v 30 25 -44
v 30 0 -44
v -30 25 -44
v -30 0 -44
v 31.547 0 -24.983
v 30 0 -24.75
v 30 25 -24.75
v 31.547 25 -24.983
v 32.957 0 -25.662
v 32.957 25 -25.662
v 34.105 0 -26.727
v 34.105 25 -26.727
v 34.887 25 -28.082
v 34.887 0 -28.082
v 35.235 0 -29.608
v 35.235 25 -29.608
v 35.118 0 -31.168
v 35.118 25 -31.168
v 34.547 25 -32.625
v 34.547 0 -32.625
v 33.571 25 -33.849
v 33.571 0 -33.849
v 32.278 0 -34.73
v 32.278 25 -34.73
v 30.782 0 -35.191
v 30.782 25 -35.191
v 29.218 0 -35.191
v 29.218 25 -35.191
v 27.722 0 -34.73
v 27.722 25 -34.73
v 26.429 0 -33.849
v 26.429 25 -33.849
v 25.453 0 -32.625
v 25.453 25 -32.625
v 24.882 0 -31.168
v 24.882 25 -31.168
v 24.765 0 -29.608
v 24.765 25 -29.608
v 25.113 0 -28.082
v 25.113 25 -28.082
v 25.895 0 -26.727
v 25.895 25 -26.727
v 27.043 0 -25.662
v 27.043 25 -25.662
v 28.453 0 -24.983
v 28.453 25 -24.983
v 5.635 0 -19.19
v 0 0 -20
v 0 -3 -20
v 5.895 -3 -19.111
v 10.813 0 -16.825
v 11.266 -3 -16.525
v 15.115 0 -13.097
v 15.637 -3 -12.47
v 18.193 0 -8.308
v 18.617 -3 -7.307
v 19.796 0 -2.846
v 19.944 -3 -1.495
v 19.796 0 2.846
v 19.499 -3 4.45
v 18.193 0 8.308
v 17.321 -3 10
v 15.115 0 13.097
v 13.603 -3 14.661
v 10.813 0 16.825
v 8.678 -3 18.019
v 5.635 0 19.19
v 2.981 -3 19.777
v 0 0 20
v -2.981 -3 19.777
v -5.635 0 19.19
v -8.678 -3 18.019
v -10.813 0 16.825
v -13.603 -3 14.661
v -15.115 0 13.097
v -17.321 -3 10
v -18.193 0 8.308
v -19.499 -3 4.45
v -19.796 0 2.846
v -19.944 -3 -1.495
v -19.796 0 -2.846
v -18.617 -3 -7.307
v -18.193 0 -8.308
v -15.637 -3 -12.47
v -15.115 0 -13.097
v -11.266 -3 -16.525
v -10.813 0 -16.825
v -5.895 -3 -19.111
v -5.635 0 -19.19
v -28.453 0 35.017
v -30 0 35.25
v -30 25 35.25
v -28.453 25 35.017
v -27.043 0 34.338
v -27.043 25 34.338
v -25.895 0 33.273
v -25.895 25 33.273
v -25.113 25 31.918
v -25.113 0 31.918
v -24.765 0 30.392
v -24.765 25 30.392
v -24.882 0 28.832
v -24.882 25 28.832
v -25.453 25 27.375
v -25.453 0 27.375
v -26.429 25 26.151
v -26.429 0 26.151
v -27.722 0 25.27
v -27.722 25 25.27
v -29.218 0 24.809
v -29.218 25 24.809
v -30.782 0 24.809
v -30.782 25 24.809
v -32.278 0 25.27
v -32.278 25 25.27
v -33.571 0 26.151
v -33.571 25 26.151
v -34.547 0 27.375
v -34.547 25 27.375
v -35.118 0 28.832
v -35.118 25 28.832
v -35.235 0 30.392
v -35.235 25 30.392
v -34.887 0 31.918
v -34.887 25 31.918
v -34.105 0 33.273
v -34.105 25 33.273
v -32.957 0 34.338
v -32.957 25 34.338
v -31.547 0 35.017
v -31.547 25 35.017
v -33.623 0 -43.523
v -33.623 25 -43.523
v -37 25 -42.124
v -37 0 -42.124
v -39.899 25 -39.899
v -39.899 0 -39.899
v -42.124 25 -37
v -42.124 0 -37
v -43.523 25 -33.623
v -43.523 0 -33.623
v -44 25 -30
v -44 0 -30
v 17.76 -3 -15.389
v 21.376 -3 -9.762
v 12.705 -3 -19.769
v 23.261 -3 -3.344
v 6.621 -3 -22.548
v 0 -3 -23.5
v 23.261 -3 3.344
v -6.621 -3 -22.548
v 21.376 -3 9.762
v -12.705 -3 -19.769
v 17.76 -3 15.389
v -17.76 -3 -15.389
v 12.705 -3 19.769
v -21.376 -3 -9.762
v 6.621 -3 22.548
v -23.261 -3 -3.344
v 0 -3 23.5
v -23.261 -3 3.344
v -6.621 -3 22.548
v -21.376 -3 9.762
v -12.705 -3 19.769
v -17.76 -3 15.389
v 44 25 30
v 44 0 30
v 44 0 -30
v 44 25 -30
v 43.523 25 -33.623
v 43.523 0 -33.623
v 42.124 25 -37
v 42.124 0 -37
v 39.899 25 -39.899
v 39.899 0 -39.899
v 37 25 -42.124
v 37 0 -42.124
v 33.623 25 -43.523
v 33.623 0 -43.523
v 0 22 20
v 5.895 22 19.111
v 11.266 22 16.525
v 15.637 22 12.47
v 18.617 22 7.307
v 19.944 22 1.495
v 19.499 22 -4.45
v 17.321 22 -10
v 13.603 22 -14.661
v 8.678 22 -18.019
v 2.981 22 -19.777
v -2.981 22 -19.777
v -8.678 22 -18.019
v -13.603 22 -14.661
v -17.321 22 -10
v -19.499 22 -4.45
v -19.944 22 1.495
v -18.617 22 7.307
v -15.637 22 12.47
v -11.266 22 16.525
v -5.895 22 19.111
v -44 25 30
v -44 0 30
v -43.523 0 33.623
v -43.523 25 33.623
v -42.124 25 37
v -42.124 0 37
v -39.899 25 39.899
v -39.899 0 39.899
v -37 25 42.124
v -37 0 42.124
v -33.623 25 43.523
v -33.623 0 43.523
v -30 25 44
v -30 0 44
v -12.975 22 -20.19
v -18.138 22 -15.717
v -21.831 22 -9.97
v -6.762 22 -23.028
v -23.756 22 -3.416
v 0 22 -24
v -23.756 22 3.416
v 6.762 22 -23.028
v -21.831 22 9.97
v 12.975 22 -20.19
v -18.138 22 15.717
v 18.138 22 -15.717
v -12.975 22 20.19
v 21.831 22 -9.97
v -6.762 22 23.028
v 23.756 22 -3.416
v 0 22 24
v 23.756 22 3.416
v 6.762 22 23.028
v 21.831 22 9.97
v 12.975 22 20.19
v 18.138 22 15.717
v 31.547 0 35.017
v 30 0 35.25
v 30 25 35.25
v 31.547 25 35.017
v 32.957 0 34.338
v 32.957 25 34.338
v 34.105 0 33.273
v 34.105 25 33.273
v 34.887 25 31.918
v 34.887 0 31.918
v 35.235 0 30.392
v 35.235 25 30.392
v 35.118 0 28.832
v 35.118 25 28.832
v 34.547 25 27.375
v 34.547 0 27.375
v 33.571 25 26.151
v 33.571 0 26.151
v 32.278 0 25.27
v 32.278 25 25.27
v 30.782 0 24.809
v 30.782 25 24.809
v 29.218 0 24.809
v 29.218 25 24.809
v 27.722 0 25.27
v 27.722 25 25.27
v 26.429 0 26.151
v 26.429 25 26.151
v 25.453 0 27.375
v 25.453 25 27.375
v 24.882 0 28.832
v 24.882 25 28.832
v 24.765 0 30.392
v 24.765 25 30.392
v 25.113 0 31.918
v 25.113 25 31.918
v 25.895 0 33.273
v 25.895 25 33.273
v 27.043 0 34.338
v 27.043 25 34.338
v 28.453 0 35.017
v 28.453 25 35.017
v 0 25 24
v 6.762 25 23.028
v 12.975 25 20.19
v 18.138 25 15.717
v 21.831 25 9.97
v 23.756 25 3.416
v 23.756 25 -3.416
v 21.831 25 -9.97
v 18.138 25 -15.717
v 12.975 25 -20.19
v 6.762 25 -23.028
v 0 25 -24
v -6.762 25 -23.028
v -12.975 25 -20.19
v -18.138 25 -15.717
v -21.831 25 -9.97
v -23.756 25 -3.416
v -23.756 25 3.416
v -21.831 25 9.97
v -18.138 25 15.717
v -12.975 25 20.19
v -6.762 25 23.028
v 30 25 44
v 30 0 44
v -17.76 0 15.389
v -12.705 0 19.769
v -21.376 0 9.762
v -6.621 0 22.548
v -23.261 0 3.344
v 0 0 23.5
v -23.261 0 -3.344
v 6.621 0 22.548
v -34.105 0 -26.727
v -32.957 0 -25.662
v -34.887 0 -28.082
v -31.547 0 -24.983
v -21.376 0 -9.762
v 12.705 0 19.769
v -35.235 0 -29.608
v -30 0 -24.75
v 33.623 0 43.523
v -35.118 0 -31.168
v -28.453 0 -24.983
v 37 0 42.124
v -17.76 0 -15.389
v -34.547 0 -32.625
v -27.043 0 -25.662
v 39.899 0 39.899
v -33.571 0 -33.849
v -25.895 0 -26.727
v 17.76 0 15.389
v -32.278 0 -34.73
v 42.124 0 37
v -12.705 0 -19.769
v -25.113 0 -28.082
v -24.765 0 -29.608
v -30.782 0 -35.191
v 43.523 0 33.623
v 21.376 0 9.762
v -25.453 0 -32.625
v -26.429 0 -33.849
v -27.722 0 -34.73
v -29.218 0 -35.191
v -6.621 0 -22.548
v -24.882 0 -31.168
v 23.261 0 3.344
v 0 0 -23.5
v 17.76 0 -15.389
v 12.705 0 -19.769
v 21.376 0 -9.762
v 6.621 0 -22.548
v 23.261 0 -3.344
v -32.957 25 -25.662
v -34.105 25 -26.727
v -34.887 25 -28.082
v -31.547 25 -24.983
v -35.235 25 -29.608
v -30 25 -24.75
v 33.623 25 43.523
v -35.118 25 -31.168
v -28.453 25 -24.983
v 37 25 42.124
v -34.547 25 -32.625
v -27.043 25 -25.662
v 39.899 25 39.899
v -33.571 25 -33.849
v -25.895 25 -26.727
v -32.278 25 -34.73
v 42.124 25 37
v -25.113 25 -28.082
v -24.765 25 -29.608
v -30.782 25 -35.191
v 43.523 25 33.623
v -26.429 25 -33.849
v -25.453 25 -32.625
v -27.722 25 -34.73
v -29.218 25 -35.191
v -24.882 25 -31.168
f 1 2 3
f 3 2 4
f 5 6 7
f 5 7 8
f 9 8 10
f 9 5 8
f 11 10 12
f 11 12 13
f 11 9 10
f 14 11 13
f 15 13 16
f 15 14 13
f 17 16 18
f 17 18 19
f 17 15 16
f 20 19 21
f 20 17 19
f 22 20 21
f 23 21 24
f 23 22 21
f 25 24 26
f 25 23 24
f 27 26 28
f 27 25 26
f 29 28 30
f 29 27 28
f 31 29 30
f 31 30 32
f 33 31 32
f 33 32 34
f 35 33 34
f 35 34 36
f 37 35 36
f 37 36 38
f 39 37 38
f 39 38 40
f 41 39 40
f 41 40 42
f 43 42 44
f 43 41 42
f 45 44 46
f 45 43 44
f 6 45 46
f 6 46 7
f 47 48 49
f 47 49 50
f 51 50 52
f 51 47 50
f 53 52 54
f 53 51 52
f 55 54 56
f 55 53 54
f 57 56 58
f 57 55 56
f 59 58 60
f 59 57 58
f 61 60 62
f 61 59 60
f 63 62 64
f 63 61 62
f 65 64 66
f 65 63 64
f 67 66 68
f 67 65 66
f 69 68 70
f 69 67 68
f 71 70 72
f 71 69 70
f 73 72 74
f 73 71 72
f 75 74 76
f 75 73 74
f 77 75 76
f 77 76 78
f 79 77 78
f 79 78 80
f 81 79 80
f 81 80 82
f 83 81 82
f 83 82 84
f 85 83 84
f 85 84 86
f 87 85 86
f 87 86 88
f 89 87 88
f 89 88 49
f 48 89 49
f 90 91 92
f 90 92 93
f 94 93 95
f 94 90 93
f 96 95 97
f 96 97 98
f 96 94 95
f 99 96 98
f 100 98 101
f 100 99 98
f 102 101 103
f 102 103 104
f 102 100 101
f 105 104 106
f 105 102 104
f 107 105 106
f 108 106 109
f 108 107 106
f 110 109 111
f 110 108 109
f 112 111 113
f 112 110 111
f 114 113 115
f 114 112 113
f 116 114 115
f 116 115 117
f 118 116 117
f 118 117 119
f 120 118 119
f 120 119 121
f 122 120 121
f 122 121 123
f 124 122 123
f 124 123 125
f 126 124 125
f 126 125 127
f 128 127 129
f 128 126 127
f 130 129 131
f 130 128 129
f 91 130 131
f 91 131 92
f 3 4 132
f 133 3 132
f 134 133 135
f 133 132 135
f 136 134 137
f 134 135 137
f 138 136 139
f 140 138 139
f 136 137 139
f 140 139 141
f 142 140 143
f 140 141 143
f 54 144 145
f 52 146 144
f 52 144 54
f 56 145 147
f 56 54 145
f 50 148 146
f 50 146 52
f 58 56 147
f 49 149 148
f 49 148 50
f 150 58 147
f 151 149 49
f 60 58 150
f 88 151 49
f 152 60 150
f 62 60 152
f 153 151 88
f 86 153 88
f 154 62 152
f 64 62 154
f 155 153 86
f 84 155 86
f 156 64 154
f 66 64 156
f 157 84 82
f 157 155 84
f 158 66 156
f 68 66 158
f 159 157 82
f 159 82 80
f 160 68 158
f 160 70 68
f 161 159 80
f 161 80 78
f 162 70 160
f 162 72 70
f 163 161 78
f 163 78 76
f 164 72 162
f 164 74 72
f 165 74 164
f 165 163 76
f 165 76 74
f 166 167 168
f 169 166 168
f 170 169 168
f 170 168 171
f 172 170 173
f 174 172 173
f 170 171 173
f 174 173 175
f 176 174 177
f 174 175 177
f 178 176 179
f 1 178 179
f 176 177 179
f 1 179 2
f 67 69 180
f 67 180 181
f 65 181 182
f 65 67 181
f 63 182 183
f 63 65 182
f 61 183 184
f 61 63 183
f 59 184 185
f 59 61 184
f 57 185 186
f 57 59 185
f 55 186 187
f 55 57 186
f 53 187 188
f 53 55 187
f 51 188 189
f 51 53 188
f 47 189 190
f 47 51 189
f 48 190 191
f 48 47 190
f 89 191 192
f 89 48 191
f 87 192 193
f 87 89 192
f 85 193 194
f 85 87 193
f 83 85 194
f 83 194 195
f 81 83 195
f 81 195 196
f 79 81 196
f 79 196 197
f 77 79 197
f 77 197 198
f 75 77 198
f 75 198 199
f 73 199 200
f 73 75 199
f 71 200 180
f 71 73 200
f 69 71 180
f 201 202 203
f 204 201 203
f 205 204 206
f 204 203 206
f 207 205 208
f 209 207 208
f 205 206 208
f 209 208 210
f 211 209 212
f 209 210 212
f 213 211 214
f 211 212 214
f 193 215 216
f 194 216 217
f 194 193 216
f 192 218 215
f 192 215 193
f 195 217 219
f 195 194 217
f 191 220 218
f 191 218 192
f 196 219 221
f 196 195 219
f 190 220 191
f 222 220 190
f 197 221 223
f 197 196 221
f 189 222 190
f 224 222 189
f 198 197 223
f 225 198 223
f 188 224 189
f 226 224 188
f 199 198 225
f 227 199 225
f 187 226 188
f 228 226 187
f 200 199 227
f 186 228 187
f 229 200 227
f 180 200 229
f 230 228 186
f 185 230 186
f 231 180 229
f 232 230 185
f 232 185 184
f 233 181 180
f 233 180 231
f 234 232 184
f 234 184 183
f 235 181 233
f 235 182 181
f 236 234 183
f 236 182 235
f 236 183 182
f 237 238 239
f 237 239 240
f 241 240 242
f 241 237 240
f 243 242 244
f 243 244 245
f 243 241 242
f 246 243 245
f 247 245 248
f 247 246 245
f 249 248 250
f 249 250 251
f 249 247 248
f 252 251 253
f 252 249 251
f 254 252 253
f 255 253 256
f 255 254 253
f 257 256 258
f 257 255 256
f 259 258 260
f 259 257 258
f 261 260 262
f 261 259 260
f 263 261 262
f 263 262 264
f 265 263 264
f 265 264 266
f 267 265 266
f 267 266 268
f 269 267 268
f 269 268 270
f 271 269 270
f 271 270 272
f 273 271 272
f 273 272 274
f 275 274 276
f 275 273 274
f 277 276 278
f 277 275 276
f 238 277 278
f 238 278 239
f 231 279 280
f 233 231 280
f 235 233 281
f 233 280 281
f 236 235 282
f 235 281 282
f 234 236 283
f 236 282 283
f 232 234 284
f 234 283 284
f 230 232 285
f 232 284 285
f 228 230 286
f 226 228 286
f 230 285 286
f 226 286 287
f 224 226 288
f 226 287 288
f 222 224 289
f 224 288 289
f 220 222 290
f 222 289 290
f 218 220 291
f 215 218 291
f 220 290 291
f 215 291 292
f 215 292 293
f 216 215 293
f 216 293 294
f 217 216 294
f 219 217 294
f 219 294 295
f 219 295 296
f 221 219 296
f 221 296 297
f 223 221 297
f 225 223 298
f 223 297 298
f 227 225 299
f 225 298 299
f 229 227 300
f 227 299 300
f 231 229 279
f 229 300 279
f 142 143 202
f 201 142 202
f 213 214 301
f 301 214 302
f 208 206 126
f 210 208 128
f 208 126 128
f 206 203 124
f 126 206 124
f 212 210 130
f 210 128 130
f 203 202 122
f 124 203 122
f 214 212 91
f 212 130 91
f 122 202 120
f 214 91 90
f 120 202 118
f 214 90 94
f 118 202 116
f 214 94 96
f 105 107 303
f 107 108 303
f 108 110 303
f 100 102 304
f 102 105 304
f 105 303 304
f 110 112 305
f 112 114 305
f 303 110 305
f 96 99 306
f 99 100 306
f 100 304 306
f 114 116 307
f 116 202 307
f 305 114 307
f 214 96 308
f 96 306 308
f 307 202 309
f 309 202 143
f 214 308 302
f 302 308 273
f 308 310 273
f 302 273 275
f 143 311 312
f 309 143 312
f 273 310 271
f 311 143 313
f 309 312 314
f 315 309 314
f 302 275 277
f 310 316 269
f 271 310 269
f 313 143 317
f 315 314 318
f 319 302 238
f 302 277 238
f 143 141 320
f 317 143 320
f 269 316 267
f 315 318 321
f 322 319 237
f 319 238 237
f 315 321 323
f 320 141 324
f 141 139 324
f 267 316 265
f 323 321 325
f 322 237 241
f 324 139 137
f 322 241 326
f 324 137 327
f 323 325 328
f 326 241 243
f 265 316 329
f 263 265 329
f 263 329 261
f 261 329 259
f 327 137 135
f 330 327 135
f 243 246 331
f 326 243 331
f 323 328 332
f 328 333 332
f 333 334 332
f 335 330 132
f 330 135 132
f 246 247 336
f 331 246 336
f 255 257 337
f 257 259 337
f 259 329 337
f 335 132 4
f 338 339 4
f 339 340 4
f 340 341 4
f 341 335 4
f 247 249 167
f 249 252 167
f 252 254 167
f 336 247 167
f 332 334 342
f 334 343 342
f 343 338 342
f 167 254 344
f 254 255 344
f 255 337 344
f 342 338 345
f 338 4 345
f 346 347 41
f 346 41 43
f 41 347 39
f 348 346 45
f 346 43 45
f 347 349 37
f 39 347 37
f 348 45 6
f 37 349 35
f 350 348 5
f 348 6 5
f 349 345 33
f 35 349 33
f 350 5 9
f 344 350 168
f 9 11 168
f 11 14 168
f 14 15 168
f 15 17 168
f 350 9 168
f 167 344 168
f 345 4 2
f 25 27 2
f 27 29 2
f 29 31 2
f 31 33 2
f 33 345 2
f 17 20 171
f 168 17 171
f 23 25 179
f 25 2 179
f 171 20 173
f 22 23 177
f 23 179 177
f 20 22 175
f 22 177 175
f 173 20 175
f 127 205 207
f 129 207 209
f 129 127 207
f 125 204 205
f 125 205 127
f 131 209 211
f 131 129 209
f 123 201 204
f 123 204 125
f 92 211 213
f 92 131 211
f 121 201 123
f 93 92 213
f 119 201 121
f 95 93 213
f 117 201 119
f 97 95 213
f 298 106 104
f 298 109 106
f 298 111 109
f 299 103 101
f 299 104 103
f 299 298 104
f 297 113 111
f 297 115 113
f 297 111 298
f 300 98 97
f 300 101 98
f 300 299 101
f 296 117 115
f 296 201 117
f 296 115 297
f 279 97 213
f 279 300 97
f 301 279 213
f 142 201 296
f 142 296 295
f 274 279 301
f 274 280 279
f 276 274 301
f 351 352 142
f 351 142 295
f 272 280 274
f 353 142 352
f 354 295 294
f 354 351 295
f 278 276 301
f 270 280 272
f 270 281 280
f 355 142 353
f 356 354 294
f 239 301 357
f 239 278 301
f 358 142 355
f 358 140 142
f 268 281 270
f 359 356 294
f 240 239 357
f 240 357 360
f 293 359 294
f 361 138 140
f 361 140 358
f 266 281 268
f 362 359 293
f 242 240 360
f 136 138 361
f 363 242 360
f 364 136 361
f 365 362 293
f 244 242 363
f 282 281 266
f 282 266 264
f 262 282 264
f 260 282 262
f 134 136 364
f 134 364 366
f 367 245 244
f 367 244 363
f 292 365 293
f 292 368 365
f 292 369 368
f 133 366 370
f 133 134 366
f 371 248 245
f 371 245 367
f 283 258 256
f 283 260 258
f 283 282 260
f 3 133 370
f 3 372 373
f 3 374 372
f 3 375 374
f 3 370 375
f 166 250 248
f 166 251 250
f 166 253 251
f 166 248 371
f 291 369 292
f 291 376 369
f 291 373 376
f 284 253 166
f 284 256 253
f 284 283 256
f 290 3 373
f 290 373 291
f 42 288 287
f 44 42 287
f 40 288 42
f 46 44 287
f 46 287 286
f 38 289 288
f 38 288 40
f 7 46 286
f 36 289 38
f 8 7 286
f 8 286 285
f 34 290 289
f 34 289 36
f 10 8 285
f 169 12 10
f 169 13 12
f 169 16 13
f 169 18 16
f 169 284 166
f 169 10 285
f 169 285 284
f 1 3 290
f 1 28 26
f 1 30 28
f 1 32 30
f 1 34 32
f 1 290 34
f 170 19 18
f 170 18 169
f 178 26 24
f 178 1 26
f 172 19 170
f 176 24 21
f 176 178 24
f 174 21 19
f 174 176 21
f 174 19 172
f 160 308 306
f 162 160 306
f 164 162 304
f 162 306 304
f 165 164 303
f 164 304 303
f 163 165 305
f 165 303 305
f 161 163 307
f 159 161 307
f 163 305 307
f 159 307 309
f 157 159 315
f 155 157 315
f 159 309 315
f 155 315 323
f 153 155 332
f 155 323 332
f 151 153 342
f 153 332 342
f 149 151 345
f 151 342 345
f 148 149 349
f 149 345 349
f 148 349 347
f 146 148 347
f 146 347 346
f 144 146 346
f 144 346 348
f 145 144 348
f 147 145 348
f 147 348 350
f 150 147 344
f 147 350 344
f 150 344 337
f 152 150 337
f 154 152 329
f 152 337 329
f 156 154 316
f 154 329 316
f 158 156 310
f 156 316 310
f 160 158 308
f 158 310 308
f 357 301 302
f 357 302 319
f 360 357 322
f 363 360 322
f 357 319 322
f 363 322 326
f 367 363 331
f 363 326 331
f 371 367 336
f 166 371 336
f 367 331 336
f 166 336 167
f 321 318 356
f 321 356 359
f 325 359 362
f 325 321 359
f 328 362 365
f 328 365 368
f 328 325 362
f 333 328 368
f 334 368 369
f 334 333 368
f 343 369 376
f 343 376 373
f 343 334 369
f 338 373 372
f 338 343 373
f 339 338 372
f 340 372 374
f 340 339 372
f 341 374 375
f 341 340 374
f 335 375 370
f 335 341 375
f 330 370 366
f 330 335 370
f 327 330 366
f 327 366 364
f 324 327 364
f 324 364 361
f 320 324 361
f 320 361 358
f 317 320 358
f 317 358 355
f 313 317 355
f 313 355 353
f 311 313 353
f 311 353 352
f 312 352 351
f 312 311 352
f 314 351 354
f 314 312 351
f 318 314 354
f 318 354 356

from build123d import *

# Parameters (mm, degrees)
ESQUISSE1_R             = 5.25
ESQUISSE1_R_2           = 20
BOSS_EXTRU_1_DEPTH      = 25
ESQUISSE2_R             = 24
ENL_V_MAT_EXTRU_1_DEPTH = 3
ESQUISSE3_R             = 23.5
ESQUISSE3_R_2           = 20
BOSS_EXTRU_2_DEPTH      = 3


with BuildPart() as part:
    # Esquisse1 → Boss.-Extru.1 (new body)
    with BuildSketch(Plane(origin=(0, 0, 0), x_dir=(1, 0, 0), z_dir=(0, 1, 0))):
        with BuildLine():
            Line((-44, 30), (-44, -30))
            ThreePointArc((-44, -30), (-39.899495706, -39.899494167), (-30.000002176, -44))
            Line((-30.000002176, -44), (30, -44))
            ThreePointArc((30, -44), (39.899494937, -39.899494937), (44, -30))
            Line((44, -30), (44, 30))
            ThreePointArc((44, 30), (39.899494937, 39.899494937), (30, 44))
            Line((30, 44), (-30.000002176, 44))
            ThreePointArc((-30.000002176, 44), (-39.899495706, 39.899494167), (-44, 30))
        make_face()
        with Locations(Location((-30, 30, 0), (0, 0, 270))):  # turned: the seam where the file's is
            Circle(ESQUISSE1_R, mode=Mode.SUBTRACT)
        with Locations(Location((30, 30, 0), (0, 0, 270))):  # turned: the seam where the file's is
            Circle(ESQUISSE1_R, mode=Mode.SUBTRACT)
        with Locations(Location((30, -30, 0), (0, 0, 270))):  # turned: the seam where the file's is
            Circle(ESQUISSE1_R, mode=Mode.SUBTRACT)
        with Locations(Location((-30, -30, 0), (0, 0, 270))):  # turned: the seam where the file's is
            Circle(ESQUISSE1_R, mode=Mode.SUBTRACT)
        with Locations(Location((0, 0, 0), (0, 0, 270))):  # turned: the seam where the file's is
            Circle(ESQUISSE1_R_2, mode=Mode.SUBTRACT)
    extrude(amount=BOSS_EXTRU_1_DEPTH)

    # Esquisse2 → Enlèv. mat.-Extru.1 (cut)
    with BuildSketch(Plane(origin=(0, 25, 0), x_dir=(1, 0, 0), z_dir=(0, 1, 0))):
        with Locations(Location((0, 0, 0), (0, 0, 270))):  # turned: the seam where the file's is
            Circle(ESQUISSE2_R)
    extrude(amount=-ENL_V_MAT_EXTRU_1_DEPTH, mode=Mode.SUBTRACT)

    # Esquisse3 → Boss.-Extru.2 (add)
    with BuildSketch(Plane.XZ):
        with Locations(Location((0, 0, 0), (0, 0, 90))):  # turned: the seam where the file's is
            Circle(ESQUISSE3_R)
        with Locations(Location((0, 0, 0), (0, 0, 270))):  # turned: the seam where the file's is
            Circle(ESQUISSE3_R_2, mode=Mode.SUBTRACT)
    extrude(amount=BOSS_EXTRU_2_DEPTH)


solid = part.part
